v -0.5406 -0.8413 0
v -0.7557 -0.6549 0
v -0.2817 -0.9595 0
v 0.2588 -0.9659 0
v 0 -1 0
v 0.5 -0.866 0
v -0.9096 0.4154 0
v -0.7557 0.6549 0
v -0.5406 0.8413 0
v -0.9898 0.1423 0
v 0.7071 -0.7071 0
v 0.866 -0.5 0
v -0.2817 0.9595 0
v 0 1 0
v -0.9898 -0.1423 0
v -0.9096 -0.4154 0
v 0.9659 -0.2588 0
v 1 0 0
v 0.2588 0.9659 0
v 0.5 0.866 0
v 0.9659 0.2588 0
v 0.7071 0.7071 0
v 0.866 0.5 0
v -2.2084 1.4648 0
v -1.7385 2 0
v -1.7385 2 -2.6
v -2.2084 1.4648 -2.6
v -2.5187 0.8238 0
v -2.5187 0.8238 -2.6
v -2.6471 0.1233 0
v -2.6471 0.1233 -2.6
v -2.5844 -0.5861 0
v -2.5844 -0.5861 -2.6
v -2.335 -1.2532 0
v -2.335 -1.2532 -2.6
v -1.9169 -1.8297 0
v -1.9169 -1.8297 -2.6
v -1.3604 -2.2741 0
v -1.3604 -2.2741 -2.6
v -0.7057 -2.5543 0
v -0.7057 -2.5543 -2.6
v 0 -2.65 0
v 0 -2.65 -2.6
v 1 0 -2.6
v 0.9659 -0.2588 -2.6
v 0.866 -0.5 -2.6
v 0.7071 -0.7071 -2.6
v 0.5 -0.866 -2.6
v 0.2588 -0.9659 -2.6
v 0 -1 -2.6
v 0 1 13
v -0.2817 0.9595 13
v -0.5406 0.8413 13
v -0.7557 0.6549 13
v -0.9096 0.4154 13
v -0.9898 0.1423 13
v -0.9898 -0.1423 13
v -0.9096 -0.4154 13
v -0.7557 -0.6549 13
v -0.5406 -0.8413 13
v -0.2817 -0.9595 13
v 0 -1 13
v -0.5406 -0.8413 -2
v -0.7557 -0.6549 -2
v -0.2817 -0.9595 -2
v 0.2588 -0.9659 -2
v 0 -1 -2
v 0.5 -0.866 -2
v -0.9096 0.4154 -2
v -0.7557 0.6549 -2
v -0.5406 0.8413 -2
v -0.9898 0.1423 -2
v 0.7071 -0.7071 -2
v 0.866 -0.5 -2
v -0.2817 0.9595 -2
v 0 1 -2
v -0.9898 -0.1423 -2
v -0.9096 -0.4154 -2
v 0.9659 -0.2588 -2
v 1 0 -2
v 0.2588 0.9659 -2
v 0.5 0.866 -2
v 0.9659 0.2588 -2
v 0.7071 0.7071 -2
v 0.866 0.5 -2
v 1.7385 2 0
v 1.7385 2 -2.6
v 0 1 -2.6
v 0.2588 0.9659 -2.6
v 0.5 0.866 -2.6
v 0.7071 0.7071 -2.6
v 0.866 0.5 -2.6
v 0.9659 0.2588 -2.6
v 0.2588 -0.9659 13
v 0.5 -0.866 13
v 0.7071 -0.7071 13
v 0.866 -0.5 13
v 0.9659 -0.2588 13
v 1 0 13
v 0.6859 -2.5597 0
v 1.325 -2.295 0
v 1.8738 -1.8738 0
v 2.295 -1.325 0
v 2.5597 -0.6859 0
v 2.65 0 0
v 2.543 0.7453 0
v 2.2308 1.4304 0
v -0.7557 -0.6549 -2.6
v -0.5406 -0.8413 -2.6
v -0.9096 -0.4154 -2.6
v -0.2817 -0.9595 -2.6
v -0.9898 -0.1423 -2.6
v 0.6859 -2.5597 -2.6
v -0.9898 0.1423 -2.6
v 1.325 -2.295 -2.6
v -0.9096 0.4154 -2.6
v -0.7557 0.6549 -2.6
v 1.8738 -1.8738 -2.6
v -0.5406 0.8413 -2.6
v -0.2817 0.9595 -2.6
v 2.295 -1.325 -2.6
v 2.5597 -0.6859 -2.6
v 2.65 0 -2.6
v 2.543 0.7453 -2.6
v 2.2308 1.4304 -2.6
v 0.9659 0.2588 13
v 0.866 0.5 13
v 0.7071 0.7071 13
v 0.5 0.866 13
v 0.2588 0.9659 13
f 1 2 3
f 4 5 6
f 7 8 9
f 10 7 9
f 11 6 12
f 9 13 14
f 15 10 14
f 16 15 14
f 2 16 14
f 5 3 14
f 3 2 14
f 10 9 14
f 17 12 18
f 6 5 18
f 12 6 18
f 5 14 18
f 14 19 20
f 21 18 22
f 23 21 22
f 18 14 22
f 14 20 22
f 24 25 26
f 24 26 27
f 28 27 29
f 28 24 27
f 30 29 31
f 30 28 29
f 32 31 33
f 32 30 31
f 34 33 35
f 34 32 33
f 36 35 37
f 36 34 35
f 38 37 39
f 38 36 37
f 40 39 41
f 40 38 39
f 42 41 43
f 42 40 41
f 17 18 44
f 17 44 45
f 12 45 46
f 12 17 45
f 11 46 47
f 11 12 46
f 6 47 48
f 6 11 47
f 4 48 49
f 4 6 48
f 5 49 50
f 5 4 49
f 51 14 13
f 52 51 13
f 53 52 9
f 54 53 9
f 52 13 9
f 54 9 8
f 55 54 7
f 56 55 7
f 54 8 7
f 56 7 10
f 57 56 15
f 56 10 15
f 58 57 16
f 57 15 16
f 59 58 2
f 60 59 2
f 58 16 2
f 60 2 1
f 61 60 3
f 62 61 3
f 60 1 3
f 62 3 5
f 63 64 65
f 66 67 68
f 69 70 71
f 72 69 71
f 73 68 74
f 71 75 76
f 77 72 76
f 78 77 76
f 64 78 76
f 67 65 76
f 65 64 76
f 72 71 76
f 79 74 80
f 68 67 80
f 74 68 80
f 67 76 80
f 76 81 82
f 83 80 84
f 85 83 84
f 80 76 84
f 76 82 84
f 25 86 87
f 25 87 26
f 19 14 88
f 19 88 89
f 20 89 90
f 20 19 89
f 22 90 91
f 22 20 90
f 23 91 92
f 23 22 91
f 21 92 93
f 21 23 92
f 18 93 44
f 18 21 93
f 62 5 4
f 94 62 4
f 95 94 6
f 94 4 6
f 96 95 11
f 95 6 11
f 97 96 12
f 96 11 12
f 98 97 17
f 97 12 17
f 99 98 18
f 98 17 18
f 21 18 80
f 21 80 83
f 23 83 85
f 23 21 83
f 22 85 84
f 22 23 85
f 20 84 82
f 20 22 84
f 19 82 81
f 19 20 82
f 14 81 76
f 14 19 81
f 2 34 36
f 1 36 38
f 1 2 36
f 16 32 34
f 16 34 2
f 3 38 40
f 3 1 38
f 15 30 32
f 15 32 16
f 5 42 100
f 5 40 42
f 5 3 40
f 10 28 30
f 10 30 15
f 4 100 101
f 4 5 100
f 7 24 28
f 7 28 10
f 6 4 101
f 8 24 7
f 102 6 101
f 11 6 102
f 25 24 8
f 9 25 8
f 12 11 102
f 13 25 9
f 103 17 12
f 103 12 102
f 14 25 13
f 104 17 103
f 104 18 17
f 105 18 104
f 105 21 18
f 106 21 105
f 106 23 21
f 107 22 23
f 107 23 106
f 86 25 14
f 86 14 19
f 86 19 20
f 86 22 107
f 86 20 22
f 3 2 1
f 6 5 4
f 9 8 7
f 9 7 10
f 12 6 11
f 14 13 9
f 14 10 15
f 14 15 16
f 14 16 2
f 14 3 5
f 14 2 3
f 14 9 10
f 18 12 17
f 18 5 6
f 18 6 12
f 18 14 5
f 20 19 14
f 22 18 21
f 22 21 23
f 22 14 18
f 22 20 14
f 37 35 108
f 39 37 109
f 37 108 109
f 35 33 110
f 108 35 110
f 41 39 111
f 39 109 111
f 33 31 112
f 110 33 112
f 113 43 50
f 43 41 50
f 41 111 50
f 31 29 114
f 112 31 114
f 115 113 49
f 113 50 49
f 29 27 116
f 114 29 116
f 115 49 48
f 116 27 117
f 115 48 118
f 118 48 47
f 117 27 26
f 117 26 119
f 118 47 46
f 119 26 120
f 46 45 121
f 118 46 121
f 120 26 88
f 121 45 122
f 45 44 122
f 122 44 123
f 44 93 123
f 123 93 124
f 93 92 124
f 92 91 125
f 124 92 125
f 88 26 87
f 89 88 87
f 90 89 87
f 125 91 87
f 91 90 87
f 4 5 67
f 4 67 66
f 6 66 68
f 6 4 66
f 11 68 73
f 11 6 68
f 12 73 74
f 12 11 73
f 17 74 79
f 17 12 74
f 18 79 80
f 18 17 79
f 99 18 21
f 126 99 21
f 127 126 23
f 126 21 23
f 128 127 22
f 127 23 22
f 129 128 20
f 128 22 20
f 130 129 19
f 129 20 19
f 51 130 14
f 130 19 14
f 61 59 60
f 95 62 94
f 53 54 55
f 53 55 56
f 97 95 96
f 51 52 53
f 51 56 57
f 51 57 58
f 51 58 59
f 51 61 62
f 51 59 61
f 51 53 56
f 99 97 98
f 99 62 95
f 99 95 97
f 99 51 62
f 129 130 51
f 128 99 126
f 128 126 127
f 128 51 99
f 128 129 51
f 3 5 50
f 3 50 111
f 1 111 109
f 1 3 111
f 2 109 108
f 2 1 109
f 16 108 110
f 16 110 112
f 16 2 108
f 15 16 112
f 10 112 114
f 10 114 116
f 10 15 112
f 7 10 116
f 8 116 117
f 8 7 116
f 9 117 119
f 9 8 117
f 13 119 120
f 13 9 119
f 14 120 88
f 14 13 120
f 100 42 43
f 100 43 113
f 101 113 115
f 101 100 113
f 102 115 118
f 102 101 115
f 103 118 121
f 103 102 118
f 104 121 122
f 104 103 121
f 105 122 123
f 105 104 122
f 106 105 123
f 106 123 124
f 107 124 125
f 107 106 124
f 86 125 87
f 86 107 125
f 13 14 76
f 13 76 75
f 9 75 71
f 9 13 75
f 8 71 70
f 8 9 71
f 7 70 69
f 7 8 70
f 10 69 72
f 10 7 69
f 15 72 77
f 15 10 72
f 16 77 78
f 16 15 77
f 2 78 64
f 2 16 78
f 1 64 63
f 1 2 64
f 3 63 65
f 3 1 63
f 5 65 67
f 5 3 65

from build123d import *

# Parameters (mm, degrees)
F1_DEPTH = 2.6
F2_DEPTH = 13
F3_DEPTH = 2


with BuildPart() as f1:
    # F0 (on Top) → F1 (new body)
    with BuildSketch(Plane.XY):
        with BuildLine():
            ThreePointArc((0, -2.65), (1.8738329701, -1.8738329701), (2.65, 0))
            ThreePointArc((2.65, 0), (2.4113911693, 1.0989506944), (1.7385338651, 2))
            Line((1.7385338651, 2), (0, 2))
            Line((0, 2), (0, 1))
            ThreePointArc((0, 1), (0.7071067812, 0.7071067812), (1, 0))
            ThreePointArc((1, 0), (0.7071067812, -0.7071067812), (0, -1))
            Line((0, -1), (0, -2.65))
        make_face()
        with BuildLine():
            ThreePointArc((-1.7385338651, 2), (-2.4821865361, -0.9280355597), (0, -2.65))
            Line((0, -2.65), (0, -1))
            ThreePointArc((0, -1), (-1, 0), (0, 1))
            Line((0, 1), (0, 2))
            Line((0, 2), (-1.7385338651, 2))
        make_face()
    extrude(amount=-F1_DEPTH)


with BuildPart() as f2:
    # F0 (on Top) → F2 (new body)
    with BuildSketch(Plane.XY):
        with BuildLine():
            ThreePointArc((0, 1), (-1, 0), (0, -1))
            Line((0, -1), (0, 1))
        make_face()
        with BuildLine():
            Line((0, 1), (0, -1))
            ThreePointArc((0, -1), (0.7071067812, -0.7071067812), (1, 0))
            ThreePointArc((1, 0), (0.7071067812, 0.7071067812), (0, 1))
        make_face()
    extrude(amount=F2_DEPTH)


with BuildPart() as f3:
    # F3 (new): a face of the model
    f3_faces = [f2.part.faces().sort_by_distance(p)[0] for p in [
        (0, 0, 0),
    ]]
    extrude(f3_faces, amount=F3_DEPTH)


solid = Compound([f1.part, f2.part, f3.part])
